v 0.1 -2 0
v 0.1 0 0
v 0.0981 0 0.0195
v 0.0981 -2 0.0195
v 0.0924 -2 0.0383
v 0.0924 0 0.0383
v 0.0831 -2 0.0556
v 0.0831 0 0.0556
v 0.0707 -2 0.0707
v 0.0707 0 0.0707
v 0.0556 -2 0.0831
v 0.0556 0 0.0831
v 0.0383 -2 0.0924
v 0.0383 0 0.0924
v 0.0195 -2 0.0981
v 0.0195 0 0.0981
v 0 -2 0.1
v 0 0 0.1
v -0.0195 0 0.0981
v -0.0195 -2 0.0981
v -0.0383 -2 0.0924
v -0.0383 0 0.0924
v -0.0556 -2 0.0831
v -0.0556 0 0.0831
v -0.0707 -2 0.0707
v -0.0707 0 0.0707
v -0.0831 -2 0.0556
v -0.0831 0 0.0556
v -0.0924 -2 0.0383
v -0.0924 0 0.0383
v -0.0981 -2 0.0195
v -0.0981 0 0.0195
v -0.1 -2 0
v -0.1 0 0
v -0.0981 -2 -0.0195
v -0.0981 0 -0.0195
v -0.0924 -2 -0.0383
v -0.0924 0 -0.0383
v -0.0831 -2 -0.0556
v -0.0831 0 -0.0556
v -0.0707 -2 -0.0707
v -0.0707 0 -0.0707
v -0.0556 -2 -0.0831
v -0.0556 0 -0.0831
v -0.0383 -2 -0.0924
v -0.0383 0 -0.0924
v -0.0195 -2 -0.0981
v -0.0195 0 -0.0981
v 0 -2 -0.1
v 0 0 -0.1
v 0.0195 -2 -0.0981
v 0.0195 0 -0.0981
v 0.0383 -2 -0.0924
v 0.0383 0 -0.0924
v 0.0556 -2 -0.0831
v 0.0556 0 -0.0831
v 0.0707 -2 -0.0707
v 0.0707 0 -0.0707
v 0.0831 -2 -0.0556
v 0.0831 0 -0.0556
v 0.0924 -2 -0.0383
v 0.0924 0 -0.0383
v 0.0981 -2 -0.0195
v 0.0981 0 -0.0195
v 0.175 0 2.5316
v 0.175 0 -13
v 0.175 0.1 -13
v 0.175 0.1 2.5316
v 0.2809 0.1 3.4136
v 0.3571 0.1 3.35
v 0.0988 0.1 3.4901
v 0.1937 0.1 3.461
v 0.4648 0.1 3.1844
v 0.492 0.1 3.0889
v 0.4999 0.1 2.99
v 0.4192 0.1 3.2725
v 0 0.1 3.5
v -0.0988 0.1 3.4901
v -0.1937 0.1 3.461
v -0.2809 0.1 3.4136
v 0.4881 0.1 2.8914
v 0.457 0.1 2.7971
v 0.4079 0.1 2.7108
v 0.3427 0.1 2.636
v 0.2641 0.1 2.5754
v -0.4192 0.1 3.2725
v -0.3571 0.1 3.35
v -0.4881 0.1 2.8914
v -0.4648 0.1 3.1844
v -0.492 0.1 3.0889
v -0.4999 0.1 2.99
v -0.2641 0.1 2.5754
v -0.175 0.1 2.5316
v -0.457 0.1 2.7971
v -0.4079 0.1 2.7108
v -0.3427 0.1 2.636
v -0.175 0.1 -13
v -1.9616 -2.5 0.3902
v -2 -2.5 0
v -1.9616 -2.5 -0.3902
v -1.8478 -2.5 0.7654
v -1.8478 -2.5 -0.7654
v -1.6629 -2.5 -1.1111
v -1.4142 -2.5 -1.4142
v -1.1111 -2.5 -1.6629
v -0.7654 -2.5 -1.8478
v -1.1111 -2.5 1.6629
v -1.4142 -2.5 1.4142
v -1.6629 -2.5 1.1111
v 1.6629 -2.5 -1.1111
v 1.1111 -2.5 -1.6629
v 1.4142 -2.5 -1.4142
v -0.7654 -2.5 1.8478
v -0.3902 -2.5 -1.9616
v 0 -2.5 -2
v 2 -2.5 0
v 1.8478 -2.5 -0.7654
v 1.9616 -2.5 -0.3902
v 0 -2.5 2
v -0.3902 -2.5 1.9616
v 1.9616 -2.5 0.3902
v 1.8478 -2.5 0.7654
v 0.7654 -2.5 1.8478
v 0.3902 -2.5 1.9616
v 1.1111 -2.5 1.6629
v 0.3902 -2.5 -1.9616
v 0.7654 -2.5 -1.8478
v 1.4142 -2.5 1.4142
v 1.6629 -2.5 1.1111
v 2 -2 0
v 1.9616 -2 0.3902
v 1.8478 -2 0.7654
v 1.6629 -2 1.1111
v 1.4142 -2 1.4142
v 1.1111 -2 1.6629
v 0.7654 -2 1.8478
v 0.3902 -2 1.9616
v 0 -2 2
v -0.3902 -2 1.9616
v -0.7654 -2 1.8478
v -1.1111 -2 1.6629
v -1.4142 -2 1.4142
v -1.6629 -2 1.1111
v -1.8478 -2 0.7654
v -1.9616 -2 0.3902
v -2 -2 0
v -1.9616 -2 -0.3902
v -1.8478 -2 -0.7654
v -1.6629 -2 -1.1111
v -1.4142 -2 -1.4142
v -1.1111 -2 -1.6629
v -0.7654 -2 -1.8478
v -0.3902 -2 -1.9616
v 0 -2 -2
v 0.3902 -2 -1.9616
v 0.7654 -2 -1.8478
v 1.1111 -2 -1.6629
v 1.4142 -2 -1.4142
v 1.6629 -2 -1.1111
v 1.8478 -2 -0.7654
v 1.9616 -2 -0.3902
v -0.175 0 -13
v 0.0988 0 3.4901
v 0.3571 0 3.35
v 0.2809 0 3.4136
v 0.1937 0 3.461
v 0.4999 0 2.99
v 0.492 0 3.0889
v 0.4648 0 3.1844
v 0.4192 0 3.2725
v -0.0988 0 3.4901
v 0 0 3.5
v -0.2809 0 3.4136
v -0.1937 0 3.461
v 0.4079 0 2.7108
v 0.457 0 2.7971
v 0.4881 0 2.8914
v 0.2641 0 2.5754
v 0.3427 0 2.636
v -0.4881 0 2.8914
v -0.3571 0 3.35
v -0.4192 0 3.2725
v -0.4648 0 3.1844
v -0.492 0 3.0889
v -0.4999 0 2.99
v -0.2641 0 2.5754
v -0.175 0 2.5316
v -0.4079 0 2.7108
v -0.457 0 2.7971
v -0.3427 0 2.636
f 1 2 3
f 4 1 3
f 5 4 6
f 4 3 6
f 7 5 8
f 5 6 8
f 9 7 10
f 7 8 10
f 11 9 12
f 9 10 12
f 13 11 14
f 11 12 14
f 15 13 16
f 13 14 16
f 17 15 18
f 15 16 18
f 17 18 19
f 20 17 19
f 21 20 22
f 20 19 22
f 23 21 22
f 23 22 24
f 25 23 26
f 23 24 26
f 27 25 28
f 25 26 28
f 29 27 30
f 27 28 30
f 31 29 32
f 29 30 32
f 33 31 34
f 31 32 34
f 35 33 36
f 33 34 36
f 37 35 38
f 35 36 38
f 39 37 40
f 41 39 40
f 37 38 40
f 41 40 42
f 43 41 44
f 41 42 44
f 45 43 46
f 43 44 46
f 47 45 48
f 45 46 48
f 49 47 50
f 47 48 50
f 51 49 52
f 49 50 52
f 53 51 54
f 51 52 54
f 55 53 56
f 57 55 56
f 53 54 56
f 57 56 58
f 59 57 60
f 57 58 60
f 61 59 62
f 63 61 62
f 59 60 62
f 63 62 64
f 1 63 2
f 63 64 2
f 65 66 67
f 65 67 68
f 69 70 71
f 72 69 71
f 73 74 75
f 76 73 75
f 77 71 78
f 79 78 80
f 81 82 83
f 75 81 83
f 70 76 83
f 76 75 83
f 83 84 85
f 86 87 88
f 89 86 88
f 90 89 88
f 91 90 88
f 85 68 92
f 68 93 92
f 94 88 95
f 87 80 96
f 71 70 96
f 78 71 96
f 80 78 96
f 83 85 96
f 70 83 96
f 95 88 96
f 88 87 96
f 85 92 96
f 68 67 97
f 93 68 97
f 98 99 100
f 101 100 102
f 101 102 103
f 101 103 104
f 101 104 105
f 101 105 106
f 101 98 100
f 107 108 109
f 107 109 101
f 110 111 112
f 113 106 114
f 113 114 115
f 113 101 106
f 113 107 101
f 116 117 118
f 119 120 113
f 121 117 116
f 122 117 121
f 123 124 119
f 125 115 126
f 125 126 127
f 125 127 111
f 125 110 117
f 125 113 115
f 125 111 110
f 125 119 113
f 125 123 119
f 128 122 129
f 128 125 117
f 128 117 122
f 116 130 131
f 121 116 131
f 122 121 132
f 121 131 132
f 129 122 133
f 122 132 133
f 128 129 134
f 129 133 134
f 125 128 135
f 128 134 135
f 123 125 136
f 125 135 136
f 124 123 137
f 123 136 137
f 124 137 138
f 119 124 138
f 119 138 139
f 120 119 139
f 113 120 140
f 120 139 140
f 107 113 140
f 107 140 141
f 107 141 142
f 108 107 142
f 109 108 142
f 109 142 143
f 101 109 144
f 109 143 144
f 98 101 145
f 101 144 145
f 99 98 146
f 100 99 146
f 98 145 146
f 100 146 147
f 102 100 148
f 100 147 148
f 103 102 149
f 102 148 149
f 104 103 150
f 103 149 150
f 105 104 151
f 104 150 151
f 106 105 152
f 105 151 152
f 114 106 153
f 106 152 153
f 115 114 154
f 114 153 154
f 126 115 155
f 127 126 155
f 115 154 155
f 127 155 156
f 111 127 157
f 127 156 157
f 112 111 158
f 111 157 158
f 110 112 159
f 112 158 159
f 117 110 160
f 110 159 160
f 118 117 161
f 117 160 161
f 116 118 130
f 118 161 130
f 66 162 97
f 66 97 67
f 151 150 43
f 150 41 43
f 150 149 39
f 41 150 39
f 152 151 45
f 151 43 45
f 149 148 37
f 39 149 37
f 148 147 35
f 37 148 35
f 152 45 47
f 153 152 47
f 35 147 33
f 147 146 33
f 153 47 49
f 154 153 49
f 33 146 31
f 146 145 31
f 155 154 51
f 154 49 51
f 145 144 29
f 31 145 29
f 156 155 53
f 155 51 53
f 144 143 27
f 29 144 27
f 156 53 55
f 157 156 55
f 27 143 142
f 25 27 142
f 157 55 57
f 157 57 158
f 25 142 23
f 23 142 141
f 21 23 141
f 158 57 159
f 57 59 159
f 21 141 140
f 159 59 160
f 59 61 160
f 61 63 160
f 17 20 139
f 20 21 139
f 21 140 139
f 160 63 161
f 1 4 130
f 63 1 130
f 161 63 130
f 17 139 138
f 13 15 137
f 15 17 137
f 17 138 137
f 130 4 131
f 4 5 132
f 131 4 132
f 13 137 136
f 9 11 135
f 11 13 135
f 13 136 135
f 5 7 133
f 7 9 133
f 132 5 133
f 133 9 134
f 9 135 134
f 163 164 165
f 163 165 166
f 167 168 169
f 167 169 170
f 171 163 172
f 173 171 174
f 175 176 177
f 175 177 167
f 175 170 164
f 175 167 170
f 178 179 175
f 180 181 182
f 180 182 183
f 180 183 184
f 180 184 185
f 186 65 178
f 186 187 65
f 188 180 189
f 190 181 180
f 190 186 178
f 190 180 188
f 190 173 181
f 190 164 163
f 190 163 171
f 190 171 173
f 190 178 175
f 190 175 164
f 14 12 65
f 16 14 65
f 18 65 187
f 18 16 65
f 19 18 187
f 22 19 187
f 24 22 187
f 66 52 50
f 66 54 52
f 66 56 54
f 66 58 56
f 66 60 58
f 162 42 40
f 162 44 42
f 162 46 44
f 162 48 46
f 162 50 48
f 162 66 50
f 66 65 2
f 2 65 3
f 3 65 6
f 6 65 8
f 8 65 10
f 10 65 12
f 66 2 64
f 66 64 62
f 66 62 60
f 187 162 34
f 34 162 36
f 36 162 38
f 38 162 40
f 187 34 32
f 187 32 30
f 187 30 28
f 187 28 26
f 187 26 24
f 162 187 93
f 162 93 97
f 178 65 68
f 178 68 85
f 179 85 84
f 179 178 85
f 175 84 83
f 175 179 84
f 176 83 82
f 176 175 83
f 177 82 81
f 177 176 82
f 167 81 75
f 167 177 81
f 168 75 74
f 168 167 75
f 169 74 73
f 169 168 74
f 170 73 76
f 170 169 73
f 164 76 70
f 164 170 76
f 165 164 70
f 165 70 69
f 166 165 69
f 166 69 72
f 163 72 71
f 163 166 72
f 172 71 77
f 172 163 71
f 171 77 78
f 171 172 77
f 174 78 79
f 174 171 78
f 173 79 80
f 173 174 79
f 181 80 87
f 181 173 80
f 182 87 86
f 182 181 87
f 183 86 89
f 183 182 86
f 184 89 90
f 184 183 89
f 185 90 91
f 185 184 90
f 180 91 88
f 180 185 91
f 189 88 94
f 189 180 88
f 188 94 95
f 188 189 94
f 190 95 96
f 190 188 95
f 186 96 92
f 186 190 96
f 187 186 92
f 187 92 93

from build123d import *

# Parameters (mm, degrees)
BOSS_EXTRUDE1_DEPTH = 0.1
SKETCH2_R           = 0.1
BOSS_EXTRUDE2_DEPTH = 2
SKETCH3_R           = 2
BOSS_EXTRUDE3_DEPTH = 0.5


with BuildPart() as part:
    # Sketch1 → Boss-Extrude1 (new body)
    with BuildSketch(Plane(origin=(0, 0, 0), x_dir=(1, 0, 0), z_dir=(0, 1, 0))):
        with BuildLine():
            Line((-0.175, 0.46837485), (-0.175, 13))
            Line((-0.175, 13), (0.175, 13))
            Line((0.175, 13), (0.175, 0.46837485))
            Line((0.175, 0.46837485), (0.175, -0.46837485))
            Line((0.175, -0.46837485), (0.175, -2.53162515))
            ThreePointArc((0.175, -2.53162515), (0, -3.5), (-0.175, -2.53162515))
            Line((-0.175, -2.53162515), (-0.175, -0.46837485))
            Line((-0.175, -0.46837485), (-0.175, 0.46837485))
        make_face()
    extrude(amount=BOSS_EXTRUDE1_DEPTH)

    # Sketch2 → Boss-Extrude2 (add)
    with BuildSketch(Plane.XZ):
        Circle(SKETCH2_R)
    extrude(amount=BOSS_EXTRUDE2_DEPTH)

    # Sketch3 → Boss-Extrude3 (add)
    with BuildSketch(Plane.XZ.offset(2)):
        Circle(SKETCH3_R)
    extrude(amount=BOSS_EXTRUDE3_DEPTH)


solid = part.part
